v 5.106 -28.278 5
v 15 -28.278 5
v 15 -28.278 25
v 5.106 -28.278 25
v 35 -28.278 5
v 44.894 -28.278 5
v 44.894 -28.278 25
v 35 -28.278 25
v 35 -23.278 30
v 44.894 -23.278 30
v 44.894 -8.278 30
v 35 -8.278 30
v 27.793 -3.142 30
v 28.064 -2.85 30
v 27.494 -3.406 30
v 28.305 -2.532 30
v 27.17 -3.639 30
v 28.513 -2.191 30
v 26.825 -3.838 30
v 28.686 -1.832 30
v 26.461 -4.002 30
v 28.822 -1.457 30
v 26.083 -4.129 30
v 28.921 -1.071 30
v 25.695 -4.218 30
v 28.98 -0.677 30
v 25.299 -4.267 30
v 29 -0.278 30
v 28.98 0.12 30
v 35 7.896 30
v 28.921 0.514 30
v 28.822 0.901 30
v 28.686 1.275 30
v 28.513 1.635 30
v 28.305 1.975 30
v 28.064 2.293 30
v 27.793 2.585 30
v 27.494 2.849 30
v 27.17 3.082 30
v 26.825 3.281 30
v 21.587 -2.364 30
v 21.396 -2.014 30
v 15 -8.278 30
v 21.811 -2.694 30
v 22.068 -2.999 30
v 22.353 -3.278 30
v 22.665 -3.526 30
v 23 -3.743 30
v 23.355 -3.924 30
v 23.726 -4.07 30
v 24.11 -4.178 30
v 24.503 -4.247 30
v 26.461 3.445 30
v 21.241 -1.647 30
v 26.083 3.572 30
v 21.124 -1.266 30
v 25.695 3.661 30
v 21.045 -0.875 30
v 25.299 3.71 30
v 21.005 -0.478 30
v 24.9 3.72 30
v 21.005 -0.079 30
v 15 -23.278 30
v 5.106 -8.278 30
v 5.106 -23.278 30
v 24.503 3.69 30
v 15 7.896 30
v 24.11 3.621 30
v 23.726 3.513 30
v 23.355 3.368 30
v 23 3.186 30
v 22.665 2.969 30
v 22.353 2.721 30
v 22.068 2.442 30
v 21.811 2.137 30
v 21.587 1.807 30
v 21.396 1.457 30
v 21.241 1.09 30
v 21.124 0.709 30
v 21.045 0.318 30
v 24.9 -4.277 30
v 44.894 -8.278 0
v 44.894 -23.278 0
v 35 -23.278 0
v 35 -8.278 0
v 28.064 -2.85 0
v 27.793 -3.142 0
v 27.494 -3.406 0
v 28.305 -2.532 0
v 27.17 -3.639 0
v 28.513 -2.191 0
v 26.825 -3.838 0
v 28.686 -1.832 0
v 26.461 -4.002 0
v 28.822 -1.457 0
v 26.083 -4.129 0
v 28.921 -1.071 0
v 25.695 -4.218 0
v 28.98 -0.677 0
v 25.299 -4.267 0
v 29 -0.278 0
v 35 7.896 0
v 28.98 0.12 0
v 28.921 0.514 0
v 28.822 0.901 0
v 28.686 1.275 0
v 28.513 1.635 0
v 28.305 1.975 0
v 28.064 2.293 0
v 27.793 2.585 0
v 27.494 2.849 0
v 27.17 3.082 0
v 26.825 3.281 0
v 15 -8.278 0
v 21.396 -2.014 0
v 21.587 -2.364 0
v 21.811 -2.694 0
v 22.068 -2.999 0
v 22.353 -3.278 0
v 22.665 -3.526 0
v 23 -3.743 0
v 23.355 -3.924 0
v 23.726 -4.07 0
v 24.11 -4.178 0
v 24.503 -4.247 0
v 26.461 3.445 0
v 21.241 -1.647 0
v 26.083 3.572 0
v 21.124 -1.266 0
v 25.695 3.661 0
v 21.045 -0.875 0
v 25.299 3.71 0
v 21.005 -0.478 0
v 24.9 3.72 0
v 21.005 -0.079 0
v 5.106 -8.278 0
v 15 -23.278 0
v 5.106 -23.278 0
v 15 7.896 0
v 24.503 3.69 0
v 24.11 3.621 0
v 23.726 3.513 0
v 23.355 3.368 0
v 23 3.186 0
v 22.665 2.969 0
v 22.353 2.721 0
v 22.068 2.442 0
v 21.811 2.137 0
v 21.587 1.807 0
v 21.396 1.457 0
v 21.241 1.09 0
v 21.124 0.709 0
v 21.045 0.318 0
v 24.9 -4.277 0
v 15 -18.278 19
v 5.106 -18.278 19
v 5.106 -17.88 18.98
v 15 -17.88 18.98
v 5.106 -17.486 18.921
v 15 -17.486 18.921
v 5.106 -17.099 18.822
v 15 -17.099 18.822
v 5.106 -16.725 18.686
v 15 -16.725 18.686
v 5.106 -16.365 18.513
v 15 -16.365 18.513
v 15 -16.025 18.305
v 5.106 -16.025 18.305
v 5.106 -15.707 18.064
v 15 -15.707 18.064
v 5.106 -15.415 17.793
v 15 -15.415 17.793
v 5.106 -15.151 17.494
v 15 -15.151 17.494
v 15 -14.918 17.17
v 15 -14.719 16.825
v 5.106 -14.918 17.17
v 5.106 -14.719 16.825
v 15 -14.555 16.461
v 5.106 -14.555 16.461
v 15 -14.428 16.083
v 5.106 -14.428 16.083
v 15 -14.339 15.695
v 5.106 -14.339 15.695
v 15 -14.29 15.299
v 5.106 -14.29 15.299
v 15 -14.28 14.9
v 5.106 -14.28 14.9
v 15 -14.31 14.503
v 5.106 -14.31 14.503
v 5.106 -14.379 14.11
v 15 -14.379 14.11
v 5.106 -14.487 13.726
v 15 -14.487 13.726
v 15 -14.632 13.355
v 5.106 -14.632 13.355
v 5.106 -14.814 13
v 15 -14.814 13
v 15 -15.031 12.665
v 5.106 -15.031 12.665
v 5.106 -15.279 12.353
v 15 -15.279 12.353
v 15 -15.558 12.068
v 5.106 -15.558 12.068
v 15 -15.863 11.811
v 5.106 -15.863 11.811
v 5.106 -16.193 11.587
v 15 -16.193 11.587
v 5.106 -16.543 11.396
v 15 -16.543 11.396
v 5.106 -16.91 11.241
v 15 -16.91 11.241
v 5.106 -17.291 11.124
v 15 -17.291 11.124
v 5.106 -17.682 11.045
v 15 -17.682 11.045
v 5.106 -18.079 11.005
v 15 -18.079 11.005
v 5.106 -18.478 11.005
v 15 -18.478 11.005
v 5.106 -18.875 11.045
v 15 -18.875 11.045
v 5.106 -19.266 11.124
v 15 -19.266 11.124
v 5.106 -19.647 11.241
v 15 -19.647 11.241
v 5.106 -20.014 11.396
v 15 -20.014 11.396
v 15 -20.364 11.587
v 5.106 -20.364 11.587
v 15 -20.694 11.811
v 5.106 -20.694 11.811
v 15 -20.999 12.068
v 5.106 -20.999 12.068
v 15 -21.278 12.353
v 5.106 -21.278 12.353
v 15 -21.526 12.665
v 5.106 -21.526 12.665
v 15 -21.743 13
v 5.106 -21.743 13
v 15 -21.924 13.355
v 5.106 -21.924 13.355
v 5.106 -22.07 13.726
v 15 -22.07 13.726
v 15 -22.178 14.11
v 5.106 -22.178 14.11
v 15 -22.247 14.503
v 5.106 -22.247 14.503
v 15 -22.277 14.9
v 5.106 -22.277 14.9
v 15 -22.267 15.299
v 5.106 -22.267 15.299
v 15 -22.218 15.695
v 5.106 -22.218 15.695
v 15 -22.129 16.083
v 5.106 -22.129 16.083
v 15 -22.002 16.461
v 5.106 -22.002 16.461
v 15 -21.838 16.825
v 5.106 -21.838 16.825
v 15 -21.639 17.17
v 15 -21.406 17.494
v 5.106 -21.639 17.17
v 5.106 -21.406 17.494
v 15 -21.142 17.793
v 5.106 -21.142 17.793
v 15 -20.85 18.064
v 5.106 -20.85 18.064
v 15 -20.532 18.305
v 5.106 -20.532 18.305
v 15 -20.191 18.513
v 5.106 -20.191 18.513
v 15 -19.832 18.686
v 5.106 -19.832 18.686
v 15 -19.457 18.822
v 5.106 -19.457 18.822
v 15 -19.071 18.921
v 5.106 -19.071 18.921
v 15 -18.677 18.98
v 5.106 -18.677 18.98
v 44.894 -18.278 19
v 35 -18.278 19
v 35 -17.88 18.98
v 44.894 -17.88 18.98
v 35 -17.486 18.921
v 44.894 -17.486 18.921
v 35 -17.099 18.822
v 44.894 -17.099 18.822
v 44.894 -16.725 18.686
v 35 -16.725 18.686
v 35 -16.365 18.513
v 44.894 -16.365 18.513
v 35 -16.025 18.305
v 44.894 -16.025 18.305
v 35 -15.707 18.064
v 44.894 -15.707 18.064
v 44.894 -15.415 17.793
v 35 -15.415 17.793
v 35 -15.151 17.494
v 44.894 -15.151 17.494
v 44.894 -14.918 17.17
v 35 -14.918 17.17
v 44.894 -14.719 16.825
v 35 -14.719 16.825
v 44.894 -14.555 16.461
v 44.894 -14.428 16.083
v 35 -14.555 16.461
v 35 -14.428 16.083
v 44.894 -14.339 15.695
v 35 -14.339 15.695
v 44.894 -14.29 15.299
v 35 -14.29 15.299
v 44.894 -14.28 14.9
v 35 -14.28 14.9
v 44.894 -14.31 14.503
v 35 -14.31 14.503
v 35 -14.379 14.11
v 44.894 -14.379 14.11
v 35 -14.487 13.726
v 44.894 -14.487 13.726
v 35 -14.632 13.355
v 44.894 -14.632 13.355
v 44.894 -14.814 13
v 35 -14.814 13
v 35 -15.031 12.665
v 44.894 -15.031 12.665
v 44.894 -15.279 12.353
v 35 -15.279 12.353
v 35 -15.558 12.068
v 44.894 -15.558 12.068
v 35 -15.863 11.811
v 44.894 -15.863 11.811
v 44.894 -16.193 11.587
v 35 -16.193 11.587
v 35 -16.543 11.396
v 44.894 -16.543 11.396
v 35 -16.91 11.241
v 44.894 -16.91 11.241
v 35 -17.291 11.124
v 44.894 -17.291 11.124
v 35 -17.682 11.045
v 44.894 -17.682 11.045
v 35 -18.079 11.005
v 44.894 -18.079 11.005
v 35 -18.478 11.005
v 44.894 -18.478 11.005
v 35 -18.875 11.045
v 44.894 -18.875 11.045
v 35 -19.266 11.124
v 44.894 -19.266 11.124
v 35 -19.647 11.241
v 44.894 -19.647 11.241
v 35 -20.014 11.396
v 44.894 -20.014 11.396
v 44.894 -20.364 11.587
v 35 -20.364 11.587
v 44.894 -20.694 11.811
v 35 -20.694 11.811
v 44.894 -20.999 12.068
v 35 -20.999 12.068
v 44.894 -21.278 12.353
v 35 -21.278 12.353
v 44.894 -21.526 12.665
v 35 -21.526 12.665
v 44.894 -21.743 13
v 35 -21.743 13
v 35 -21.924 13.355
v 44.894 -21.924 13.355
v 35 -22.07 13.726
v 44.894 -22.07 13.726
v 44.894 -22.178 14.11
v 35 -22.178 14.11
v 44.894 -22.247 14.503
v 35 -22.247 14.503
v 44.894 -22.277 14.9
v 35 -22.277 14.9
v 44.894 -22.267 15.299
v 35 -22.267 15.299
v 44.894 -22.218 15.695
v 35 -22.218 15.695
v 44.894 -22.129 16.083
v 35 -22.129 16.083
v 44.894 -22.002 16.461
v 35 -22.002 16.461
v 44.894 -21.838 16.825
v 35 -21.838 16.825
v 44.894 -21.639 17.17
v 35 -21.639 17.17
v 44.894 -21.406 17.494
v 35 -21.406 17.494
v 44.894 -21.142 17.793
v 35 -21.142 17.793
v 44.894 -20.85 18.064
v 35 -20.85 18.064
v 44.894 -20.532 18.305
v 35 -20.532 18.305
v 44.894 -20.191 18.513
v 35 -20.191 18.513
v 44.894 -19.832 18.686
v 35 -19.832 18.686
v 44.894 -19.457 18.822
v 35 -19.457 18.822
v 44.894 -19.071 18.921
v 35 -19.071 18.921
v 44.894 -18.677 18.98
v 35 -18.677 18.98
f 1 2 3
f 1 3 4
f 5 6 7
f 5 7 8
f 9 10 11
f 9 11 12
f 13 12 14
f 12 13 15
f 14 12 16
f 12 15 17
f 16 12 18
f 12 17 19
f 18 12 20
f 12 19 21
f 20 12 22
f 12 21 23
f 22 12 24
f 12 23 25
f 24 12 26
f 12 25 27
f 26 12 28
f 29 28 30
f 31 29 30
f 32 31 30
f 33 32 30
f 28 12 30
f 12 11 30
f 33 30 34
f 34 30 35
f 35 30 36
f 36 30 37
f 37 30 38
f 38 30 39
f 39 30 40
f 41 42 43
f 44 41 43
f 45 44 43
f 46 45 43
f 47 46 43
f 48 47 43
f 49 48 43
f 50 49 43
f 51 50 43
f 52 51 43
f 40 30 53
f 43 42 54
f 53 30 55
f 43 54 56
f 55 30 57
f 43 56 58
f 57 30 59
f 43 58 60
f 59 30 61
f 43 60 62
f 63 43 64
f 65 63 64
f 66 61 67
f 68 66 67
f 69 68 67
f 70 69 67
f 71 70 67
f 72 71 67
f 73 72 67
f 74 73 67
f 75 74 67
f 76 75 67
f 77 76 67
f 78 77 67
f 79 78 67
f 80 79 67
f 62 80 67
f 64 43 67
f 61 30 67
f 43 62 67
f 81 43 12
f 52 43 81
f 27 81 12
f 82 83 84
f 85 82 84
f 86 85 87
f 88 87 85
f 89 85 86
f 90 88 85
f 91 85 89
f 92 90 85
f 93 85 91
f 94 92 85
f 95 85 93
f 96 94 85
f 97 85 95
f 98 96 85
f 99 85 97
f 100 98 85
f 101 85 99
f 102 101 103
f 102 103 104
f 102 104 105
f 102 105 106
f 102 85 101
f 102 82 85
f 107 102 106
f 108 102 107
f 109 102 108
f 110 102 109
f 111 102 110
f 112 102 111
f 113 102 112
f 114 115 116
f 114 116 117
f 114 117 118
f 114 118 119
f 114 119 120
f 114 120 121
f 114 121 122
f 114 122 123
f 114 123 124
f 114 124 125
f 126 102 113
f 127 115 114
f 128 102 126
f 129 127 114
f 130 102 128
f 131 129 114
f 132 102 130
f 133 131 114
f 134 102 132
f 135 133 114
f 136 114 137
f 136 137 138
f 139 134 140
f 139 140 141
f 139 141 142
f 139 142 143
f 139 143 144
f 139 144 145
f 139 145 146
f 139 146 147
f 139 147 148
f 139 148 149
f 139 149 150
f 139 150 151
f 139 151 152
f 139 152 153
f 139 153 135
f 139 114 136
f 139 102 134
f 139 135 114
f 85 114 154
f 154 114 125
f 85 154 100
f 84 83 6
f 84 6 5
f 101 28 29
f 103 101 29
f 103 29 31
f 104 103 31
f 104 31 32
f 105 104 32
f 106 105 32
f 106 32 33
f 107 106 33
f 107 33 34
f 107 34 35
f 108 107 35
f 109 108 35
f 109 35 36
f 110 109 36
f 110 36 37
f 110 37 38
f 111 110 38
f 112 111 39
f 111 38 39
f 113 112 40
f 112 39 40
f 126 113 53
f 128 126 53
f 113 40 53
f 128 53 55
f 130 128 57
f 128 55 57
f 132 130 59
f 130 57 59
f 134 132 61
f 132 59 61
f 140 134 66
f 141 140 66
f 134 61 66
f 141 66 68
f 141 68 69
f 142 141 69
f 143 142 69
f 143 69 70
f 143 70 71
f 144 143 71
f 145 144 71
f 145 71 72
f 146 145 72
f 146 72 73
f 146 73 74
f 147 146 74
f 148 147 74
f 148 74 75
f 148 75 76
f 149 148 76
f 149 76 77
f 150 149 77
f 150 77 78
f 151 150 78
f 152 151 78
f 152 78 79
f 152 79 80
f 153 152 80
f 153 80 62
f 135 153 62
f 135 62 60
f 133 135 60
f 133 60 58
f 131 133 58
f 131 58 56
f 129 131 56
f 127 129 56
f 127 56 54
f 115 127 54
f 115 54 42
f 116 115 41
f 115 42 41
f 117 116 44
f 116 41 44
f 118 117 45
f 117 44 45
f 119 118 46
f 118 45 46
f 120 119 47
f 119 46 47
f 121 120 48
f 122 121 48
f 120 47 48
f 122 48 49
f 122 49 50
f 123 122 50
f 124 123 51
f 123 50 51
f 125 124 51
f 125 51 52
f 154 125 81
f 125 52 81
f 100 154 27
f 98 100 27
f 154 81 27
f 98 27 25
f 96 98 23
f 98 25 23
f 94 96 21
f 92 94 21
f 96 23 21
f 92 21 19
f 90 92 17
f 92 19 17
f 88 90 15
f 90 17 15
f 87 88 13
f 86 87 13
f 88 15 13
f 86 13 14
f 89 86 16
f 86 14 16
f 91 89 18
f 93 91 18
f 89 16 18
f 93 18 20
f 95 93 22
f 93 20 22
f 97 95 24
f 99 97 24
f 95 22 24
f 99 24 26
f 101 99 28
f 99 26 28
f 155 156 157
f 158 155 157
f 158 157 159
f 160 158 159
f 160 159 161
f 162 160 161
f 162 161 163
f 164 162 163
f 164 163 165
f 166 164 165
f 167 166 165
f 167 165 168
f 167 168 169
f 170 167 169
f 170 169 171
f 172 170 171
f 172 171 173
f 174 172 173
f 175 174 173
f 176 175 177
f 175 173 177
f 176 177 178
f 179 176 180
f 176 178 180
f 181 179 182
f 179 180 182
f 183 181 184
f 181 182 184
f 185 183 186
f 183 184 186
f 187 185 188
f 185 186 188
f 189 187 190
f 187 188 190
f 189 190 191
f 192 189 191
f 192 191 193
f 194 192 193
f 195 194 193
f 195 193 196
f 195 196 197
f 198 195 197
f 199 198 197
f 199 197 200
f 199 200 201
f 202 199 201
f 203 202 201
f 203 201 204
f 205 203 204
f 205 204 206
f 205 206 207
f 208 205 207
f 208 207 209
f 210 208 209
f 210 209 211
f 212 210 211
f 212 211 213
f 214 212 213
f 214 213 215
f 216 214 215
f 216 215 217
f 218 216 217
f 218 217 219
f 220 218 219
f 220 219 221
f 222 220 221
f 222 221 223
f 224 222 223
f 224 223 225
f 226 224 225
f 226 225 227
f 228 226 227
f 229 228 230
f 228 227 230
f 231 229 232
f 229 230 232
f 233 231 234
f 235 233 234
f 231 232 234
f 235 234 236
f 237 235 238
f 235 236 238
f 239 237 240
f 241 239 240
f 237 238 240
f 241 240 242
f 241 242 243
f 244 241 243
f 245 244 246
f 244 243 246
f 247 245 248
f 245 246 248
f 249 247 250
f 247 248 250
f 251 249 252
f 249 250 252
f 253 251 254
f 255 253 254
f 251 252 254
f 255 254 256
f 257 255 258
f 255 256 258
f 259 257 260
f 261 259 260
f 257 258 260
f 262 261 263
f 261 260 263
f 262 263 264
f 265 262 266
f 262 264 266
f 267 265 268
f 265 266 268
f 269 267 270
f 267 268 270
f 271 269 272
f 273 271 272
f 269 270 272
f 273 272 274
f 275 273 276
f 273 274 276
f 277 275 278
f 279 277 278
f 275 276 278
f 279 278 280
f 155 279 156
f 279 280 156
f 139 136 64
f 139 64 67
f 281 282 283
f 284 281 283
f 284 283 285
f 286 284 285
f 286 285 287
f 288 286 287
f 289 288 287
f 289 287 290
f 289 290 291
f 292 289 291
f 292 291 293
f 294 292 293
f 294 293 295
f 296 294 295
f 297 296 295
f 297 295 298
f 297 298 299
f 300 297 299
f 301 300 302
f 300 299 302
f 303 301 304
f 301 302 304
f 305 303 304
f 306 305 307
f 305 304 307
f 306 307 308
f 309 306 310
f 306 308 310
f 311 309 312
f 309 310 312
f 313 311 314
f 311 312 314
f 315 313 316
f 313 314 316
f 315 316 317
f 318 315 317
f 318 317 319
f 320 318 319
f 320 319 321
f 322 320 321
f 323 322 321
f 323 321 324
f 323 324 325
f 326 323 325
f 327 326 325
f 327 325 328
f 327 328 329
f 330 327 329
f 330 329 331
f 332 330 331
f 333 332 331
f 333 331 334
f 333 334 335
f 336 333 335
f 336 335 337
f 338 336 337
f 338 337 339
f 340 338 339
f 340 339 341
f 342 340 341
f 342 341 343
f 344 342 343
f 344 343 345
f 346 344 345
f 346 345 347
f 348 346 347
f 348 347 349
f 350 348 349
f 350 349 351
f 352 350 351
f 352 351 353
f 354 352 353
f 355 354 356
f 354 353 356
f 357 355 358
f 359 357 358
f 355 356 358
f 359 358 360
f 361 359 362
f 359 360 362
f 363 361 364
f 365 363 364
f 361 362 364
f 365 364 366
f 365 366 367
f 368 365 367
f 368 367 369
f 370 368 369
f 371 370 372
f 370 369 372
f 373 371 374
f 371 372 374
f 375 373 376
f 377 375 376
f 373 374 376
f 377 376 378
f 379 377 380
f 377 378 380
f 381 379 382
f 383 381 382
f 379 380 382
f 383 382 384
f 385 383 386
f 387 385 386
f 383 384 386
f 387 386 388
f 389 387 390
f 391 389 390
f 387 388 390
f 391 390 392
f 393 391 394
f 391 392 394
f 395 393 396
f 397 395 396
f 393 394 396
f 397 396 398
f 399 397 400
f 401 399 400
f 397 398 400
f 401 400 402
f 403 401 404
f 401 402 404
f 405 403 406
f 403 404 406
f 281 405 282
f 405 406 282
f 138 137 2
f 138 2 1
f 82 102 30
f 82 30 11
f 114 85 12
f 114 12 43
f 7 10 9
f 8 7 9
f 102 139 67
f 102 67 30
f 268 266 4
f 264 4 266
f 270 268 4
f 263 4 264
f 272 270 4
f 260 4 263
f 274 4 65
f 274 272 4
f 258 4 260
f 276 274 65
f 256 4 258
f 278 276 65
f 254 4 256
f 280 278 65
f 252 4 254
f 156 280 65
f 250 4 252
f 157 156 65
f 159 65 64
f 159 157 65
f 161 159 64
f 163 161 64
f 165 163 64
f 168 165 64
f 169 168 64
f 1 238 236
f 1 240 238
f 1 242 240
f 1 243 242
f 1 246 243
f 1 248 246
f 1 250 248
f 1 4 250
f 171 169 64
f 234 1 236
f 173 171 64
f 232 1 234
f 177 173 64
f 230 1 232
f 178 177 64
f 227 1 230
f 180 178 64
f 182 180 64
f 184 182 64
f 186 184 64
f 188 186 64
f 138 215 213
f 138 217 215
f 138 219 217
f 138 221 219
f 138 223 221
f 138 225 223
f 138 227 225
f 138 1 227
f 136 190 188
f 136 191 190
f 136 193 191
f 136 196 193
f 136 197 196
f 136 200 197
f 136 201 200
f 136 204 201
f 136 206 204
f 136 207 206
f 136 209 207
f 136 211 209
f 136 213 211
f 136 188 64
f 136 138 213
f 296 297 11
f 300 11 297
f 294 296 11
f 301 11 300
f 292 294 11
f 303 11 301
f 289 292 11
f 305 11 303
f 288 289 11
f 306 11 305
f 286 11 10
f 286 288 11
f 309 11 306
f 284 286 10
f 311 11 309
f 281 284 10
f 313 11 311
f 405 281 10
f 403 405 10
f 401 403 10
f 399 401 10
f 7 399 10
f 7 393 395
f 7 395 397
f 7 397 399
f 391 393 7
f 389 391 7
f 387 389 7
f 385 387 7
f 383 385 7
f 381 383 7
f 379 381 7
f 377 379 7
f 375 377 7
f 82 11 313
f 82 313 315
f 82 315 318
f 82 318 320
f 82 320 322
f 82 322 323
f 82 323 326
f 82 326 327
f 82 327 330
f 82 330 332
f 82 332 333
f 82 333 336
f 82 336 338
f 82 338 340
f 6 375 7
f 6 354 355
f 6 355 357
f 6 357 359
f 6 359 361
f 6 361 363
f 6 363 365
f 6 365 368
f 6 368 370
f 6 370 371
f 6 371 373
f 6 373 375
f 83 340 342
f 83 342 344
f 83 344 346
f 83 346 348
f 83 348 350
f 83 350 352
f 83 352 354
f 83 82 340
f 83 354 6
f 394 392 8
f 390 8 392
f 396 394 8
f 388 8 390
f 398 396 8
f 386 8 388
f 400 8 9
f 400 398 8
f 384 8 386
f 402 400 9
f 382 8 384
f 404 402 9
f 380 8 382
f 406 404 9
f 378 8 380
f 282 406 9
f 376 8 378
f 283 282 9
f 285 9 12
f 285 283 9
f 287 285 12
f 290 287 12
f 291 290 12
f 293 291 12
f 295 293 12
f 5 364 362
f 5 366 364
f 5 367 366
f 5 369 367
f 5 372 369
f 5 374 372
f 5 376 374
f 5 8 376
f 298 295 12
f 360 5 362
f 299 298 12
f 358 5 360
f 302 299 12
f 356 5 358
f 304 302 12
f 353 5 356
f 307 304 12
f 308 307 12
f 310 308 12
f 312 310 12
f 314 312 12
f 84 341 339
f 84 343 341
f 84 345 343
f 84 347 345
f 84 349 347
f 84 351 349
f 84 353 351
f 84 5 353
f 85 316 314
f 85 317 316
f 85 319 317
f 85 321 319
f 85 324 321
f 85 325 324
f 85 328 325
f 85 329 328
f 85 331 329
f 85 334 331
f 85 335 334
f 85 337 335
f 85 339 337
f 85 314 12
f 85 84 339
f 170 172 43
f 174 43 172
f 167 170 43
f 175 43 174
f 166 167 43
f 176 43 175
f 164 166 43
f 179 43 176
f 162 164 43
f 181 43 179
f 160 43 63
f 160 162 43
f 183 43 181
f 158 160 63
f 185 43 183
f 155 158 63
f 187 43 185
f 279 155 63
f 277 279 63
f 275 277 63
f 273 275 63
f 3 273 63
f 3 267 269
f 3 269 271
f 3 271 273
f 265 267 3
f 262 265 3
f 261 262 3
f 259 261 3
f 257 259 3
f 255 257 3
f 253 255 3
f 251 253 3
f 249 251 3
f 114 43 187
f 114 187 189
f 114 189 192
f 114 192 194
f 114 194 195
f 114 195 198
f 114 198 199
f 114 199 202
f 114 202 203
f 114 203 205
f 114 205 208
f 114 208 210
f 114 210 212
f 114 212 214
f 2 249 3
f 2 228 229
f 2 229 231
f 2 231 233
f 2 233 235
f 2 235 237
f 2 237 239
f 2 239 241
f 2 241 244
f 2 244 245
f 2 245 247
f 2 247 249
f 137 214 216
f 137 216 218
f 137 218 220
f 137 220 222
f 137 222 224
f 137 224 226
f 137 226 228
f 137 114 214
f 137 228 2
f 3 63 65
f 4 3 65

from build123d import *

# Parameters (mm, degrees)
EXTRUDE_1_DEPTH     = 30
CHAMFER_1_SIZE      = 5
SKETCH_2_R          = 4
CUT_EXTRUDE_2_DEPTH = 58.295890515
SKETCH_3_R          = 4
CUT_EXTRUDE_3_DEPTH = 61.952262634


with BuildPart() as part:
    # Эскиз1 → Вытянуть1 (new body)
    with BuildSketch(Plane.XY):
        Polygon((15, 7.896395833), (35, 7.896395833), (44.894389845, -8.278473804), (44.894389845, -28.278473804), (35, -28.278473804), (35, -8.278473804), (15, -8.278473804), (15, -28.278473804), (5.105610155, -28.278473804), (5.105610155, -8.278473804), align=None)
    extrude(amount=EXTRUDE_1_DEPTH)

    # Фаска1
    chamfer_1_edges = [part.edges().sort_by_distance(p)[0] for p in [
        (10.052805078, -28.278473804, 0),
        (39.947194922, -28.278473804, 0),
        (10.052805078, -28.278473804, 30),
        (39.947194922, -28.278473804, 30),
    ]]
    chamfer(chamfer_1_edges, length=CHAMFER_1_SIZE)

    # Эскиз2 → Вытянуть2 (cut, through all)
    with BuildSketch(Plane.ZY.offset(-5.105610155)):
        with Locations((15, -18.278473804)):
            Circle(SKETCH_2_R)
    extrude(amount=-CUT_EXTRUDE_2_DEPTH, mode=Mode.SUBTRACT)

    # Эскиз3 → Вытянуть3 (cut, through all)
    with BuildSketch(Plane.XY.offset(30)):
        with Locations((25, -0.278473804)):
            Circle(SKETCH_3_R)
    extrude(amount=-CUT_EXTRUDE_3_DEPTH, mode=Mode.SUBTRACT)


solid = part.part
